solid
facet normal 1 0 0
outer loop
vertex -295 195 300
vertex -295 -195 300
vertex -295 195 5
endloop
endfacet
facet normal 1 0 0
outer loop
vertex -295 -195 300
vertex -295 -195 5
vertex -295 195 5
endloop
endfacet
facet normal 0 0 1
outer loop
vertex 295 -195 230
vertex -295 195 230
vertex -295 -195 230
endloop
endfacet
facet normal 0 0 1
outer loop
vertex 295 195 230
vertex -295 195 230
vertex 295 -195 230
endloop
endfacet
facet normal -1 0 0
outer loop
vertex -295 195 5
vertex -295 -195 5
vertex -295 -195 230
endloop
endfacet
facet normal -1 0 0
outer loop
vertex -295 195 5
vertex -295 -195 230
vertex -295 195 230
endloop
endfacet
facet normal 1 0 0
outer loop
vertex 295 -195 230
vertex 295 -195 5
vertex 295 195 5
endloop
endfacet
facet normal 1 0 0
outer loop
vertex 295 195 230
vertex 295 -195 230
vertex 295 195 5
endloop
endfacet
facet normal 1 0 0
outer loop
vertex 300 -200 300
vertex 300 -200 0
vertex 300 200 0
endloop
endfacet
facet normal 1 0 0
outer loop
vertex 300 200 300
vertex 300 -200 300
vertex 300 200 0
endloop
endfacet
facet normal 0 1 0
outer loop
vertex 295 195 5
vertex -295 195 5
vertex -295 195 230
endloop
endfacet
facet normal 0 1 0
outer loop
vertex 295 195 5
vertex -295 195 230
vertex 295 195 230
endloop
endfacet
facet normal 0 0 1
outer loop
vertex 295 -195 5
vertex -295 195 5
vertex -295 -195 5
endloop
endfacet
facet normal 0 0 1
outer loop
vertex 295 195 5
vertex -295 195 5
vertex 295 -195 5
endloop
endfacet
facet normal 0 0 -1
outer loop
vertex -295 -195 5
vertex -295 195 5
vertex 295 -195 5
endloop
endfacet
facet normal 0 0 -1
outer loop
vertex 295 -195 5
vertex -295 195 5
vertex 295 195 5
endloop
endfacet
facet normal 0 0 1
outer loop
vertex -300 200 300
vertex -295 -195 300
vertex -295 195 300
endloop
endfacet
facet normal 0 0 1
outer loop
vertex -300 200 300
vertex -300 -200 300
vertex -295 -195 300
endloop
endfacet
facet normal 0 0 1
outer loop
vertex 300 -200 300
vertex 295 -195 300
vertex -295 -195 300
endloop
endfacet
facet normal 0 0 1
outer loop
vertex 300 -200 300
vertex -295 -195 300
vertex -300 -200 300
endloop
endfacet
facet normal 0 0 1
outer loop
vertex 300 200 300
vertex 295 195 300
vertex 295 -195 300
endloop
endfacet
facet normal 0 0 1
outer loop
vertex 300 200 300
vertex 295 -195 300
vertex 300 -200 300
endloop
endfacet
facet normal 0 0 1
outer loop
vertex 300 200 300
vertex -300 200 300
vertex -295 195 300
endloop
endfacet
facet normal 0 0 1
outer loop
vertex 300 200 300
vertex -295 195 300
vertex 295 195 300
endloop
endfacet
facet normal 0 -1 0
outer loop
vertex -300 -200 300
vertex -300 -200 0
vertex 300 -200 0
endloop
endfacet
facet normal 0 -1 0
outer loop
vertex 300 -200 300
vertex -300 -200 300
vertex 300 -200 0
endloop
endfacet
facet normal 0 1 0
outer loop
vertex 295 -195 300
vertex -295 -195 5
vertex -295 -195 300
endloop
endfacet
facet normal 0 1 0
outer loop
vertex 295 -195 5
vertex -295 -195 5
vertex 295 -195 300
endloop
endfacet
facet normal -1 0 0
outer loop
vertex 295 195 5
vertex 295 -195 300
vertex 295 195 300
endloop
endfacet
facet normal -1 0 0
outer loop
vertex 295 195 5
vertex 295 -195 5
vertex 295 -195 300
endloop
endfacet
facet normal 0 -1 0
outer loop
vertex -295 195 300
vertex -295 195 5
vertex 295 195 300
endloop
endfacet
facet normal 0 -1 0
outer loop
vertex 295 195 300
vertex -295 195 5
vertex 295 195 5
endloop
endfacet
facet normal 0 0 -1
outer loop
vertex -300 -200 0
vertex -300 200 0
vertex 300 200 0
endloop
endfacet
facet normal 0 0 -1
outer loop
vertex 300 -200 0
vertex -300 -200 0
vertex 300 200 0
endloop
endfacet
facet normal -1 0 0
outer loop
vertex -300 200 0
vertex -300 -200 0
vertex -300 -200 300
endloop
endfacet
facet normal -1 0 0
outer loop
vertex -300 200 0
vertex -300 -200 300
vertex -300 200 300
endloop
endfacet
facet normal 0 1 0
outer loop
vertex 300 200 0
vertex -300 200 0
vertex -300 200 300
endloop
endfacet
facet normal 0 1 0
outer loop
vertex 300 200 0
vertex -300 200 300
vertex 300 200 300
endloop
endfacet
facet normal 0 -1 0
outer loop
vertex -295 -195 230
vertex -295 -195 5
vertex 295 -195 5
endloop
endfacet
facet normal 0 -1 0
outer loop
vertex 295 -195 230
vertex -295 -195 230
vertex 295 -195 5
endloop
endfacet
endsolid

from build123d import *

# Parameters (mm, degrees)
F0_W     = 600
F0_H     = 400
F1_DEPTH = 300
F2_T     = -5
F3_W     = 590
F3_H     = 390
F4_DEPTH = 225


with BuildPart() as f1:
    # F0 (on Top) → F1 (new body)
    with BuildSketch(Plane.XY):
        Rectangle(F0_W, F0_H)
    extrude(amount=F1_DEPTH)

    # F2
    f2_openings = [f1.faces().sort_by_distance(p)[0] for p in [
        (0, 0, 300),
    ]]
    offset(amount=F2_T, openings=f2_openings)


with BuildPart() as f4:
    # F3 (on face) → F4 (new body)
    with BuildSketch(Plane.XY.offset(5)):
        Rectangle(F3_W, F3_H)
    extrude(amount=F4_DEPTH)


solid = Compound([f1.part, f4.part])
